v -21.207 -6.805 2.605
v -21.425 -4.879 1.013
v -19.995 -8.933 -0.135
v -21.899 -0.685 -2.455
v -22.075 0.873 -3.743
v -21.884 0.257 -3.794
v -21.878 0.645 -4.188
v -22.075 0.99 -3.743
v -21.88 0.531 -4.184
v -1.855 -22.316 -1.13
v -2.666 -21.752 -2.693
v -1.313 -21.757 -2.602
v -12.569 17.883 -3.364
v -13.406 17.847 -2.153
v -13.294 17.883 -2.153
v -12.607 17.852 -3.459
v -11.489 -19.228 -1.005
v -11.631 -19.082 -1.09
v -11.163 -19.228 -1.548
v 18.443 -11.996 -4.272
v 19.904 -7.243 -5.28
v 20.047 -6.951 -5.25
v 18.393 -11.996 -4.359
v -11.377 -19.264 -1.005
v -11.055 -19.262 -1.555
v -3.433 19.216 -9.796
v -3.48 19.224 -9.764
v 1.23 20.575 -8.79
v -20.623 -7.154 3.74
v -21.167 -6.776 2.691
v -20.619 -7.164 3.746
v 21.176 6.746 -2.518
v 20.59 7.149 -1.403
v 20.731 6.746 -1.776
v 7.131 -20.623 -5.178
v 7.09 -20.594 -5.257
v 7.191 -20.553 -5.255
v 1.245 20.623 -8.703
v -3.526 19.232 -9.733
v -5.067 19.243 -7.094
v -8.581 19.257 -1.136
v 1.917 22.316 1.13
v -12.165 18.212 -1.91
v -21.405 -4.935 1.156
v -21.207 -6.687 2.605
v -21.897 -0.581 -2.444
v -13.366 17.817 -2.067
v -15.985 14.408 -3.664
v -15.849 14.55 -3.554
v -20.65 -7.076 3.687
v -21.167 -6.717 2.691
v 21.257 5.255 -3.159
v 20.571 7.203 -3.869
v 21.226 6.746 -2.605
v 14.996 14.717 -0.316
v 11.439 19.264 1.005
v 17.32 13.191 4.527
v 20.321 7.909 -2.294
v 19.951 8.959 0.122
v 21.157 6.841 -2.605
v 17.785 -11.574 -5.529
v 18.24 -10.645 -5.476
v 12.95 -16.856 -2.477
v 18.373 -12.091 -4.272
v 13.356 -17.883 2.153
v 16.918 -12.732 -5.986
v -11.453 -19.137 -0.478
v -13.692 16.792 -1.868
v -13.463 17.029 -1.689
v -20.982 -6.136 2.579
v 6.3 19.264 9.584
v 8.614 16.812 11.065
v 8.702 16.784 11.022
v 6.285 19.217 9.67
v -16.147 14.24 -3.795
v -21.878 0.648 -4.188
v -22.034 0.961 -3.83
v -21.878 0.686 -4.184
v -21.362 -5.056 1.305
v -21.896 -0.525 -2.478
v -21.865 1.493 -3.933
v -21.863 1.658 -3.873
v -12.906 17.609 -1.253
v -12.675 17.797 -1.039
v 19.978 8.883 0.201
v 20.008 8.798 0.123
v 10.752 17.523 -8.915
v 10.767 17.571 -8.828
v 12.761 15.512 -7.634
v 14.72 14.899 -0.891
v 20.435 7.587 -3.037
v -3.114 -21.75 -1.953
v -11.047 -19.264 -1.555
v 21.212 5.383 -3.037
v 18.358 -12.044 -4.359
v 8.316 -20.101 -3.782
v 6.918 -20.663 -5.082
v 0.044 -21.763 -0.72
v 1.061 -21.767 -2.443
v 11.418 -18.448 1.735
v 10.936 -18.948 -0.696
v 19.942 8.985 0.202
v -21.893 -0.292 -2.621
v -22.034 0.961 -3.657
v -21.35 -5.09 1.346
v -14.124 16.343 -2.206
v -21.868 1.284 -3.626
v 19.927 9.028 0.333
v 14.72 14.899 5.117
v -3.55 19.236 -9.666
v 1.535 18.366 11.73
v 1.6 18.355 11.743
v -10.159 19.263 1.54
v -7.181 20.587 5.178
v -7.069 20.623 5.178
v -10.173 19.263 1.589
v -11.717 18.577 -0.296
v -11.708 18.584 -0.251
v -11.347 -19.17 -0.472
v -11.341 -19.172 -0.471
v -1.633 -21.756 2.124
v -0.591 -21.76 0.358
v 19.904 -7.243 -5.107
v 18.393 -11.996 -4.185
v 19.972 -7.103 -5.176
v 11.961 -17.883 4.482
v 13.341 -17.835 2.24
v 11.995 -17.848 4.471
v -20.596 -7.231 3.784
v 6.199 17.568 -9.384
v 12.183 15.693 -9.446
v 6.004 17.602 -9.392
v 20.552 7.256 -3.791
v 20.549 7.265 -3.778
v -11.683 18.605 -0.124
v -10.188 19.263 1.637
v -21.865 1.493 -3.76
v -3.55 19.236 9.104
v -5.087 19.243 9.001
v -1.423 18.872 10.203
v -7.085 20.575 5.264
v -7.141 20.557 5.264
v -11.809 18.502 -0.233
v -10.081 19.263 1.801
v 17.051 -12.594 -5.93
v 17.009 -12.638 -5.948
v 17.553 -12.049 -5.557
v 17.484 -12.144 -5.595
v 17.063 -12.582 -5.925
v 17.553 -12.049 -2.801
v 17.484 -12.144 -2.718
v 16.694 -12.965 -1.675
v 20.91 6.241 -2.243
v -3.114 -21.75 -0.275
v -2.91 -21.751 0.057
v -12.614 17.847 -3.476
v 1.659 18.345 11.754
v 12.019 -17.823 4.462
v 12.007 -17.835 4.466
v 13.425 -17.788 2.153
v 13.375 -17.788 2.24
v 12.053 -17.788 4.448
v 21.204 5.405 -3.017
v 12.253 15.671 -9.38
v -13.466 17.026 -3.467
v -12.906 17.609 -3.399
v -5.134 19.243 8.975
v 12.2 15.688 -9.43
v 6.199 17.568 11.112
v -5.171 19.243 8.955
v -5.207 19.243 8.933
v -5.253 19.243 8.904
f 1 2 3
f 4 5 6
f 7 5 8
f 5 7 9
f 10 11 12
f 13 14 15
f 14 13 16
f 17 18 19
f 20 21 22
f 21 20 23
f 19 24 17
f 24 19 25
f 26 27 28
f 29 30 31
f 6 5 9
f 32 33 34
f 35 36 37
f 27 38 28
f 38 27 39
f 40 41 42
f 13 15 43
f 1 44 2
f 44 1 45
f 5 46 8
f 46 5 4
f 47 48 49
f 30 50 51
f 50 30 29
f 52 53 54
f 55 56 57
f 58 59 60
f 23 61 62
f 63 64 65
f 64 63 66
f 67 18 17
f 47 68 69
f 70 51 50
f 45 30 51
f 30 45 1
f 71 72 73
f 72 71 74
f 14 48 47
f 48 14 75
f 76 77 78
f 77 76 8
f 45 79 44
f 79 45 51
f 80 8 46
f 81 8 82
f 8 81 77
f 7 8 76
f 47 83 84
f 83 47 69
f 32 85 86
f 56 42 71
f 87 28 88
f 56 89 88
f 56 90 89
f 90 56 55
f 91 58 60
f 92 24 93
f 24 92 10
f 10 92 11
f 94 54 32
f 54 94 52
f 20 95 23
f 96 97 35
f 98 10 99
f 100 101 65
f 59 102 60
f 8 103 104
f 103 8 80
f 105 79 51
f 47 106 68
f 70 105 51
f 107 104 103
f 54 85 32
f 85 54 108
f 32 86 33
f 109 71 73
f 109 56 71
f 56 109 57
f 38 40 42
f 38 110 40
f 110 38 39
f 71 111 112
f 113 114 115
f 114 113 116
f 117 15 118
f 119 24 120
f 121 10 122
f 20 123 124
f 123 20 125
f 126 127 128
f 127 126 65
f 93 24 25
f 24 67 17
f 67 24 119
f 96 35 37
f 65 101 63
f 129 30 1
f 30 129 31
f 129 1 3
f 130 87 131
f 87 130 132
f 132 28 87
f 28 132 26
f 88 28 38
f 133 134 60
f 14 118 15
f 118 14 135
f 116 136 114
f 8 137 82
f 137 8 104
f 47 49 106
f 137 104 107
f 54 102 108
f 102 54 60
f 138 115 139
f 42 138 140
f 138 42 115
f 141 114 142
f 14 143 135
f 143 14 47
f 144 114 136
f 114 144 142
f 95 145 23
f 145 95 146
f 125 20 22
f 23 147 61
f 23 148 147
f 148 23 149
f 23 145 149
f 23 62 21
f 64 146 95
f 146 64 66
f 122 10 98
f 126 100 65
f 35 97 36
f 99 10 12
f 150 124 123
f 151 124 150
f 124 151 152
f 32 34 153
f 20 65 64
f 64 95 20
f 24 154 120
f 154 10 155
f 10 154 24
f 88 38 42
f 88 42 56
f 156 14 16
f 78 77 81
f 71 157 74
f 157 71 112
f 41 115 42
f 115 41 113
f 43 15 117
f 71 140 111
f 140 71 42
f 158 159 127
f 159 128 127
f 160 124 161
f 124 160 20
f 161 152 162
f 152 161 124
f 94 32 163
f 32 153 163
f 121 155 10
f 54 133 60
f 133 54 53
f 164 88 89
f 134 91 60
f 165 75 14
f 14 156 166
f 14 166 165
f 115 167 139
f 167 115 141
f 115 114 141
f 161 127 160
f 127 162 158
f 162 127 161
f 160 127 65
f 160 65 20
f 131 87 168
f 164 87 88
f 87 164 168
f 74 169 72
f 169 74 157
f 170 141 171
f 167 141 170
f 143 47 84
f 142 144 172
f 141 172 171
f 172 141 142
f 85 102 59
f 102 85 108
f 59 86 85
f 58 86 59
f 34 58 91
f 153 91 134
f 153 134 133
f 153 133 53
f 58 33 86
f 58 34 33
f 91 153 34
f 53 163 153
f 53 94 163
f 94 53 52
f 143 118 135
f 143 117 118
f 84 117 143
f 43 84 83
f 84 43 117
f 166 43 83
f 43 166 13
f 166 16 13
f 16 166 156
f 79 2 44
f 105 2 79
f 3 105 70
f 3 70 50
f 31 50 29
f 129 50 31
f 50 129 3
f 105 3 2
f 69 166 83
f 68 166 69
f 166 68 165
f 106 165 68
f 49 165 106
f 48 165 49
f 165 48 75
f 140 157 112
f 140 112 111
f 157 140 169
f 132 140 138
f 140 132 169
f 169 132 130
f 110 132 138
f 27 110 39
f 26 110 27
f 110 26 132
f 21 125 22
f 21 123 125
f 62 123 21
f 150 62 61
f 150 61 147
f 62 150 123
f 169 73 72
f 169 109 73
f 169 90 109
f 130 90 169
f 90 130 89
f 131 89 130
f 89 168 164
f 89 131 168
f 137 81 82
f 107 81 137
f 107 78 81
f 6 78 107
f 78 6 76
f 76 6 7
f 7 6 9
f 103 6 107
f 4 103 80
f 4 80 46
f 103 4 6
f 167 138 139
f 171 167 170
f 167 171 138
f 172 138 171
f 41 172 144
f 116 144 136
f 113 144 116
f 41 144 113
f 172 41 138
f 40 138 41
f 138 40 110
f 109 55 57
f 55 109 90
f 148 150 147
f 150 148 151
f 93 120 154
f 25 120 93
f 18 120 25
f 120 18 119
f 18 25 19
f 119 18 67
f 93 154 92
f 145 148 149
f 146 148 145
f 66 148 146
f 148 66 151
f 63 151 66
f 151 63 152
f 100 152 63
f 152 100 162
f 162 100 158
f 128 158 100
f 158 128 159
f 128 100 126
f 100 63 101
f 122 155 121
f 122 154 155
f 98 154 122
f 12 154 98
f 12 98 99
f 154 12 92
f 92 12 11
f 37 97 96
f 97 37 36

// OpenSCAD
// Auto-generated OpenSCAD file

    inner_points = 10*[[2.1663170564831677, -0.34419785617257703, -0.38765607758297516], [-1.442996025981491, 0.7866986144158923, 1.519751628063399], [1.8552345149142868, 0.08938090208747582, -1.233372999913796], [-1.7540785675503718, 1.2202773726759453, 0.6740347057325782], [1.7453064030745096, -1.2048588295271065, -0.6740347057325782], [-1.864006679390149, -0.07396235893863715, 1.233372999913796], [1.4342238615056286, -0.7712800712670536, -1.519751628063399], [-2.1750892209590305, 0.35961639932141576, 0.38765607758297516], [1.468891681862331, 1.4803448655131184, 0.8042791895681101], [0.6168484423213675, 1.7473133080865888, 1.2545570689075638], [-0.31453806522834865, -2.1654735231978033, -0.4088401465767429], [-1.1665813047693123, -1.8985050806243329, 0.0414377327627109], [0.43898102104550846, -0.34681056725634735, 2.1595854401021617], [-0.026742532112712505, 1.2228900837597156, -1.873206811952559], [-0.8787857716536761, 1.489858526333186, -1.4229289326131052], [0.0179703676368501, -1.207471540610877, 1.873206811952559], [-0.44775318552137083, 0.36222911040518607, -2.1595854401021617], [-1.2997964250623344, 0.6291975529786564, -1.7093075607627082], [-1.1385344489428022, -0.0769022418107572, 1.921618159677706], [1.12976228446694, 0.09232078495959586, -1.921618159677706], [-1.9529591160768351, 1.0582216841140362, -0.29249748784533813], [1.872568425092638, 1.215193370477562, -0.07135759109804152], [-0.358109735910173, 1.914125827058532, 1.1074852013948724], [0.3493375714343106, -1.8987072839096932, -1.1074852013948724], [-1.8813405895685003, -1.1997748273287232, 0.07135759109804152], [1.1094776222383604, 0.34997776999835917, 1.9047907760005465], [0.007257421988691212, -1.903261911034367, 1.1550417938533186], [2.1770300021313265, 0.35159251425091276, 0.33050894051626534], [-0.5802398407923681, 1.2155205422659117, 1.7876387668231855], [1.673687876566175, 1.0531376819156528, -1.0378897846759576], [-1.0835819663575201, 1.9170657099306518, 0.4192400416309626], [1.0748098018816579, -1.9016471667818131, -0.4192400416309626], [-1.6824600410420372, -1.037719138766814, 1.0378897846759576], [0.5714676763165056, -1.200101999117073, -1.7876387668231855], [-2.185802166607189, -0.33617397110207403, -0.33050894051626534], [1.7733532589010197, 0.6167440092864692, 1.206145721182417], [0.3947183374391723, 1.0487080232939685, 1.9347106343358773], [0.4109341652189982, -2.168413406069923, 0.2794050131871669], [-0.9677007562428493, -1.736449392062424, 1.0079699263406272], [-0.2757782637536796, 0.35191968603926227, 2.1895052984374925], [0.948215646118828, 1.056077564787773, -1.7261349444398677], [-1.282462514883983, 1.7550100213687425, -0.5472921519469536], [-0.9569878105946905, -1.0406590216389342, 1.7261349444398677], [0.2670060992778172, -0.33650114289042354, -2.1895052984374925], [-1.9636720617249939, 0.3624313136905462, -1.0106625059445786]];

    outer_points = 10*[[1.269058091079478, 1.2537842356028754, 1.3429760346034532], [-1.1407886362053834, -1.916917683440805, -0.10047815641416535], [0.6269353347347499, 1.916917683440805, 0.9583562273355116], [-1.7829113925501114, -1.2537842356028754, -0.4850979636821068], [1.7829113925501114, 1.2537842356028754, 0.4850979636821068], [-0.6269353347347499, -1.916917683440805, -0.9583562273355116], [1.1407886362053834, 1.916917683440805, 0.10047815641416535], [-1.269058091079478, -1.2537842356028754, -1.3429760346034532], [-0.48285355807647146, 0.04268387072270685, 2.179701471792137], [-1.0517412010710958, -0.7058173185606367, 1.8389481603050128], [1.693863957415824, 0.04268387072270685, -1.4543283530370714], [1.1249763144211997, -0.7058173185606367, -1.7950816645241956], [0.8186673506552729, -1.7787897762393126, 1.073200204257045], [-1.3325206521259063, 1.7787897762393126, -0.21532213333569883], [-1.9014082951205304, 1.0302885869559693, -0.556075444822823], [1.3325206521259063, -1.7787897762393126, 0.21532213333569883], [-0.8186673506552729, 1.7787897762393126, -1.073200204257045], [-1.387554993649897, 1.0302885869559693, -1.4139535157441694], [-0.18857781353705078, -2.2221043244817307, -0.11295466728279542], [0.18857781353705078, 2.2221043244817307, 0.11295466728279542], [-1.8696770145973163, -0.48599841896512486, -1.1199023954567], [-0.1848857624061775, 0.979800777081756, 1.9979678850244973], [-1.6742529475459202, -0.979800777081756, 1.1058641337721262], [1.6742529475459202, 0.979800777081756, -1.1058641337721262], [0.1848857624061775, -0.979800777081756, -1.9979678850244973], [0.4889682744617646, -1.1996196766772678, 1.8187607416585618], [1.834253682943229, -1.1996196766772678, -0.42719320621671564], [0.7673250602621547, 0.6746141360408304, 1.9854913741558673], [-1.073634024028082, -1.7475865937195063, 0.8827904946253733], [-0.27165138445338266, 1.7475865937195063, 1.3631634532499042], [-2.112610468743619, -0.6746141360408304, 0.26046257371941006], [2.112610468743619, 0.6746141360408304, -0.26046257371941006], [0.27165138445338266, -1.7475865937195063, -1.3631634532499042], [1.073634024028082, 1.7475865937195063, -0.8827904946253733], [-0.7673250602621547, -0.6746141360408304, -1.9854913741558673], [0.469357264591861, -0.26250277031821867, 2.167224960923507], [-0.4511222775532575, -1.473603135198387, 1.6158745211582601], [2.1322214786135234, -0.26250277031821867, -0.6089267929843553], [1.2117419364684048, -1.473603135198387, -1.1602772327496023], [-0.12142320135974954, -2.0527732347604317, 0.8703139837567432], [-0.7100089056510817, 2.0527732347604317, 0.517761893197188], [-2.1993760907908246, 0.09317168059691994, -0.3743418580551833], [0.7100089056510817, -2.0527732347604317, -0.517761893197188], [0.12142320135974954, 2.0527732347604317, -0.8703139837567432], [-1.3679439837799934, 0.09317168059691994, -1.7624177350091146]];

    // Convex hull for inner set (I)
    module inner_hull() {
        hull() {
            for (p = inner_points) {
                translate(p) sphere(r=0.1);
            }
        }
    }

    // Convex hull for outer set (O) minus inner hull (O \ I)
    module outer_minus_inner() {
        difference() {
            hull() {
                for (p = outer_points) {
                    translate(p) sphere(r=0.1);
                }
            }
            inner_hull(); // Subtract inner hull
        }
    }

    // Convex hull for outer set (O) minus all translated inner hulls
    module outer_minus_AllTranslationInner() {
        difference() {
            hull() {
                for (p = outer_points) {
                    translate(p) sphere(r=0.1);
                }
            }
            hull() {
                translate([0,0,50]) inner_hull();
                translate([0,0,-50]) inner_hull();
            }; // Subtract translated inner hulls
        }
    }

    // Difference between outer_minus_inner and outer_minus_AllTranslationInner
    module outer_minus_inner_diff() {
        difference() {
            // Outer minus inner
            difference() {
                hull() {
                    for (p = outer_points) {
                        translate(p) sphere(r=0.1);
                    }
                }
                inner_hull();
            }

            // Subtract Outer minus AllTranslationInner
            difference() {
                hull() {
                    for (p = outer_points) {
                        translate(p) sphere(r=0.1);
                    }
                }
                hull() {
                    translate([0,0,50]) inner_hull();
                    translate([0,0,-50]) inner_hull();
                };
            }
        }
    }

    // Rendering all with colors applied
    color([0, 1, 0, 1]) outer_minus_AllTranslationInner(); // Opaque green
    
